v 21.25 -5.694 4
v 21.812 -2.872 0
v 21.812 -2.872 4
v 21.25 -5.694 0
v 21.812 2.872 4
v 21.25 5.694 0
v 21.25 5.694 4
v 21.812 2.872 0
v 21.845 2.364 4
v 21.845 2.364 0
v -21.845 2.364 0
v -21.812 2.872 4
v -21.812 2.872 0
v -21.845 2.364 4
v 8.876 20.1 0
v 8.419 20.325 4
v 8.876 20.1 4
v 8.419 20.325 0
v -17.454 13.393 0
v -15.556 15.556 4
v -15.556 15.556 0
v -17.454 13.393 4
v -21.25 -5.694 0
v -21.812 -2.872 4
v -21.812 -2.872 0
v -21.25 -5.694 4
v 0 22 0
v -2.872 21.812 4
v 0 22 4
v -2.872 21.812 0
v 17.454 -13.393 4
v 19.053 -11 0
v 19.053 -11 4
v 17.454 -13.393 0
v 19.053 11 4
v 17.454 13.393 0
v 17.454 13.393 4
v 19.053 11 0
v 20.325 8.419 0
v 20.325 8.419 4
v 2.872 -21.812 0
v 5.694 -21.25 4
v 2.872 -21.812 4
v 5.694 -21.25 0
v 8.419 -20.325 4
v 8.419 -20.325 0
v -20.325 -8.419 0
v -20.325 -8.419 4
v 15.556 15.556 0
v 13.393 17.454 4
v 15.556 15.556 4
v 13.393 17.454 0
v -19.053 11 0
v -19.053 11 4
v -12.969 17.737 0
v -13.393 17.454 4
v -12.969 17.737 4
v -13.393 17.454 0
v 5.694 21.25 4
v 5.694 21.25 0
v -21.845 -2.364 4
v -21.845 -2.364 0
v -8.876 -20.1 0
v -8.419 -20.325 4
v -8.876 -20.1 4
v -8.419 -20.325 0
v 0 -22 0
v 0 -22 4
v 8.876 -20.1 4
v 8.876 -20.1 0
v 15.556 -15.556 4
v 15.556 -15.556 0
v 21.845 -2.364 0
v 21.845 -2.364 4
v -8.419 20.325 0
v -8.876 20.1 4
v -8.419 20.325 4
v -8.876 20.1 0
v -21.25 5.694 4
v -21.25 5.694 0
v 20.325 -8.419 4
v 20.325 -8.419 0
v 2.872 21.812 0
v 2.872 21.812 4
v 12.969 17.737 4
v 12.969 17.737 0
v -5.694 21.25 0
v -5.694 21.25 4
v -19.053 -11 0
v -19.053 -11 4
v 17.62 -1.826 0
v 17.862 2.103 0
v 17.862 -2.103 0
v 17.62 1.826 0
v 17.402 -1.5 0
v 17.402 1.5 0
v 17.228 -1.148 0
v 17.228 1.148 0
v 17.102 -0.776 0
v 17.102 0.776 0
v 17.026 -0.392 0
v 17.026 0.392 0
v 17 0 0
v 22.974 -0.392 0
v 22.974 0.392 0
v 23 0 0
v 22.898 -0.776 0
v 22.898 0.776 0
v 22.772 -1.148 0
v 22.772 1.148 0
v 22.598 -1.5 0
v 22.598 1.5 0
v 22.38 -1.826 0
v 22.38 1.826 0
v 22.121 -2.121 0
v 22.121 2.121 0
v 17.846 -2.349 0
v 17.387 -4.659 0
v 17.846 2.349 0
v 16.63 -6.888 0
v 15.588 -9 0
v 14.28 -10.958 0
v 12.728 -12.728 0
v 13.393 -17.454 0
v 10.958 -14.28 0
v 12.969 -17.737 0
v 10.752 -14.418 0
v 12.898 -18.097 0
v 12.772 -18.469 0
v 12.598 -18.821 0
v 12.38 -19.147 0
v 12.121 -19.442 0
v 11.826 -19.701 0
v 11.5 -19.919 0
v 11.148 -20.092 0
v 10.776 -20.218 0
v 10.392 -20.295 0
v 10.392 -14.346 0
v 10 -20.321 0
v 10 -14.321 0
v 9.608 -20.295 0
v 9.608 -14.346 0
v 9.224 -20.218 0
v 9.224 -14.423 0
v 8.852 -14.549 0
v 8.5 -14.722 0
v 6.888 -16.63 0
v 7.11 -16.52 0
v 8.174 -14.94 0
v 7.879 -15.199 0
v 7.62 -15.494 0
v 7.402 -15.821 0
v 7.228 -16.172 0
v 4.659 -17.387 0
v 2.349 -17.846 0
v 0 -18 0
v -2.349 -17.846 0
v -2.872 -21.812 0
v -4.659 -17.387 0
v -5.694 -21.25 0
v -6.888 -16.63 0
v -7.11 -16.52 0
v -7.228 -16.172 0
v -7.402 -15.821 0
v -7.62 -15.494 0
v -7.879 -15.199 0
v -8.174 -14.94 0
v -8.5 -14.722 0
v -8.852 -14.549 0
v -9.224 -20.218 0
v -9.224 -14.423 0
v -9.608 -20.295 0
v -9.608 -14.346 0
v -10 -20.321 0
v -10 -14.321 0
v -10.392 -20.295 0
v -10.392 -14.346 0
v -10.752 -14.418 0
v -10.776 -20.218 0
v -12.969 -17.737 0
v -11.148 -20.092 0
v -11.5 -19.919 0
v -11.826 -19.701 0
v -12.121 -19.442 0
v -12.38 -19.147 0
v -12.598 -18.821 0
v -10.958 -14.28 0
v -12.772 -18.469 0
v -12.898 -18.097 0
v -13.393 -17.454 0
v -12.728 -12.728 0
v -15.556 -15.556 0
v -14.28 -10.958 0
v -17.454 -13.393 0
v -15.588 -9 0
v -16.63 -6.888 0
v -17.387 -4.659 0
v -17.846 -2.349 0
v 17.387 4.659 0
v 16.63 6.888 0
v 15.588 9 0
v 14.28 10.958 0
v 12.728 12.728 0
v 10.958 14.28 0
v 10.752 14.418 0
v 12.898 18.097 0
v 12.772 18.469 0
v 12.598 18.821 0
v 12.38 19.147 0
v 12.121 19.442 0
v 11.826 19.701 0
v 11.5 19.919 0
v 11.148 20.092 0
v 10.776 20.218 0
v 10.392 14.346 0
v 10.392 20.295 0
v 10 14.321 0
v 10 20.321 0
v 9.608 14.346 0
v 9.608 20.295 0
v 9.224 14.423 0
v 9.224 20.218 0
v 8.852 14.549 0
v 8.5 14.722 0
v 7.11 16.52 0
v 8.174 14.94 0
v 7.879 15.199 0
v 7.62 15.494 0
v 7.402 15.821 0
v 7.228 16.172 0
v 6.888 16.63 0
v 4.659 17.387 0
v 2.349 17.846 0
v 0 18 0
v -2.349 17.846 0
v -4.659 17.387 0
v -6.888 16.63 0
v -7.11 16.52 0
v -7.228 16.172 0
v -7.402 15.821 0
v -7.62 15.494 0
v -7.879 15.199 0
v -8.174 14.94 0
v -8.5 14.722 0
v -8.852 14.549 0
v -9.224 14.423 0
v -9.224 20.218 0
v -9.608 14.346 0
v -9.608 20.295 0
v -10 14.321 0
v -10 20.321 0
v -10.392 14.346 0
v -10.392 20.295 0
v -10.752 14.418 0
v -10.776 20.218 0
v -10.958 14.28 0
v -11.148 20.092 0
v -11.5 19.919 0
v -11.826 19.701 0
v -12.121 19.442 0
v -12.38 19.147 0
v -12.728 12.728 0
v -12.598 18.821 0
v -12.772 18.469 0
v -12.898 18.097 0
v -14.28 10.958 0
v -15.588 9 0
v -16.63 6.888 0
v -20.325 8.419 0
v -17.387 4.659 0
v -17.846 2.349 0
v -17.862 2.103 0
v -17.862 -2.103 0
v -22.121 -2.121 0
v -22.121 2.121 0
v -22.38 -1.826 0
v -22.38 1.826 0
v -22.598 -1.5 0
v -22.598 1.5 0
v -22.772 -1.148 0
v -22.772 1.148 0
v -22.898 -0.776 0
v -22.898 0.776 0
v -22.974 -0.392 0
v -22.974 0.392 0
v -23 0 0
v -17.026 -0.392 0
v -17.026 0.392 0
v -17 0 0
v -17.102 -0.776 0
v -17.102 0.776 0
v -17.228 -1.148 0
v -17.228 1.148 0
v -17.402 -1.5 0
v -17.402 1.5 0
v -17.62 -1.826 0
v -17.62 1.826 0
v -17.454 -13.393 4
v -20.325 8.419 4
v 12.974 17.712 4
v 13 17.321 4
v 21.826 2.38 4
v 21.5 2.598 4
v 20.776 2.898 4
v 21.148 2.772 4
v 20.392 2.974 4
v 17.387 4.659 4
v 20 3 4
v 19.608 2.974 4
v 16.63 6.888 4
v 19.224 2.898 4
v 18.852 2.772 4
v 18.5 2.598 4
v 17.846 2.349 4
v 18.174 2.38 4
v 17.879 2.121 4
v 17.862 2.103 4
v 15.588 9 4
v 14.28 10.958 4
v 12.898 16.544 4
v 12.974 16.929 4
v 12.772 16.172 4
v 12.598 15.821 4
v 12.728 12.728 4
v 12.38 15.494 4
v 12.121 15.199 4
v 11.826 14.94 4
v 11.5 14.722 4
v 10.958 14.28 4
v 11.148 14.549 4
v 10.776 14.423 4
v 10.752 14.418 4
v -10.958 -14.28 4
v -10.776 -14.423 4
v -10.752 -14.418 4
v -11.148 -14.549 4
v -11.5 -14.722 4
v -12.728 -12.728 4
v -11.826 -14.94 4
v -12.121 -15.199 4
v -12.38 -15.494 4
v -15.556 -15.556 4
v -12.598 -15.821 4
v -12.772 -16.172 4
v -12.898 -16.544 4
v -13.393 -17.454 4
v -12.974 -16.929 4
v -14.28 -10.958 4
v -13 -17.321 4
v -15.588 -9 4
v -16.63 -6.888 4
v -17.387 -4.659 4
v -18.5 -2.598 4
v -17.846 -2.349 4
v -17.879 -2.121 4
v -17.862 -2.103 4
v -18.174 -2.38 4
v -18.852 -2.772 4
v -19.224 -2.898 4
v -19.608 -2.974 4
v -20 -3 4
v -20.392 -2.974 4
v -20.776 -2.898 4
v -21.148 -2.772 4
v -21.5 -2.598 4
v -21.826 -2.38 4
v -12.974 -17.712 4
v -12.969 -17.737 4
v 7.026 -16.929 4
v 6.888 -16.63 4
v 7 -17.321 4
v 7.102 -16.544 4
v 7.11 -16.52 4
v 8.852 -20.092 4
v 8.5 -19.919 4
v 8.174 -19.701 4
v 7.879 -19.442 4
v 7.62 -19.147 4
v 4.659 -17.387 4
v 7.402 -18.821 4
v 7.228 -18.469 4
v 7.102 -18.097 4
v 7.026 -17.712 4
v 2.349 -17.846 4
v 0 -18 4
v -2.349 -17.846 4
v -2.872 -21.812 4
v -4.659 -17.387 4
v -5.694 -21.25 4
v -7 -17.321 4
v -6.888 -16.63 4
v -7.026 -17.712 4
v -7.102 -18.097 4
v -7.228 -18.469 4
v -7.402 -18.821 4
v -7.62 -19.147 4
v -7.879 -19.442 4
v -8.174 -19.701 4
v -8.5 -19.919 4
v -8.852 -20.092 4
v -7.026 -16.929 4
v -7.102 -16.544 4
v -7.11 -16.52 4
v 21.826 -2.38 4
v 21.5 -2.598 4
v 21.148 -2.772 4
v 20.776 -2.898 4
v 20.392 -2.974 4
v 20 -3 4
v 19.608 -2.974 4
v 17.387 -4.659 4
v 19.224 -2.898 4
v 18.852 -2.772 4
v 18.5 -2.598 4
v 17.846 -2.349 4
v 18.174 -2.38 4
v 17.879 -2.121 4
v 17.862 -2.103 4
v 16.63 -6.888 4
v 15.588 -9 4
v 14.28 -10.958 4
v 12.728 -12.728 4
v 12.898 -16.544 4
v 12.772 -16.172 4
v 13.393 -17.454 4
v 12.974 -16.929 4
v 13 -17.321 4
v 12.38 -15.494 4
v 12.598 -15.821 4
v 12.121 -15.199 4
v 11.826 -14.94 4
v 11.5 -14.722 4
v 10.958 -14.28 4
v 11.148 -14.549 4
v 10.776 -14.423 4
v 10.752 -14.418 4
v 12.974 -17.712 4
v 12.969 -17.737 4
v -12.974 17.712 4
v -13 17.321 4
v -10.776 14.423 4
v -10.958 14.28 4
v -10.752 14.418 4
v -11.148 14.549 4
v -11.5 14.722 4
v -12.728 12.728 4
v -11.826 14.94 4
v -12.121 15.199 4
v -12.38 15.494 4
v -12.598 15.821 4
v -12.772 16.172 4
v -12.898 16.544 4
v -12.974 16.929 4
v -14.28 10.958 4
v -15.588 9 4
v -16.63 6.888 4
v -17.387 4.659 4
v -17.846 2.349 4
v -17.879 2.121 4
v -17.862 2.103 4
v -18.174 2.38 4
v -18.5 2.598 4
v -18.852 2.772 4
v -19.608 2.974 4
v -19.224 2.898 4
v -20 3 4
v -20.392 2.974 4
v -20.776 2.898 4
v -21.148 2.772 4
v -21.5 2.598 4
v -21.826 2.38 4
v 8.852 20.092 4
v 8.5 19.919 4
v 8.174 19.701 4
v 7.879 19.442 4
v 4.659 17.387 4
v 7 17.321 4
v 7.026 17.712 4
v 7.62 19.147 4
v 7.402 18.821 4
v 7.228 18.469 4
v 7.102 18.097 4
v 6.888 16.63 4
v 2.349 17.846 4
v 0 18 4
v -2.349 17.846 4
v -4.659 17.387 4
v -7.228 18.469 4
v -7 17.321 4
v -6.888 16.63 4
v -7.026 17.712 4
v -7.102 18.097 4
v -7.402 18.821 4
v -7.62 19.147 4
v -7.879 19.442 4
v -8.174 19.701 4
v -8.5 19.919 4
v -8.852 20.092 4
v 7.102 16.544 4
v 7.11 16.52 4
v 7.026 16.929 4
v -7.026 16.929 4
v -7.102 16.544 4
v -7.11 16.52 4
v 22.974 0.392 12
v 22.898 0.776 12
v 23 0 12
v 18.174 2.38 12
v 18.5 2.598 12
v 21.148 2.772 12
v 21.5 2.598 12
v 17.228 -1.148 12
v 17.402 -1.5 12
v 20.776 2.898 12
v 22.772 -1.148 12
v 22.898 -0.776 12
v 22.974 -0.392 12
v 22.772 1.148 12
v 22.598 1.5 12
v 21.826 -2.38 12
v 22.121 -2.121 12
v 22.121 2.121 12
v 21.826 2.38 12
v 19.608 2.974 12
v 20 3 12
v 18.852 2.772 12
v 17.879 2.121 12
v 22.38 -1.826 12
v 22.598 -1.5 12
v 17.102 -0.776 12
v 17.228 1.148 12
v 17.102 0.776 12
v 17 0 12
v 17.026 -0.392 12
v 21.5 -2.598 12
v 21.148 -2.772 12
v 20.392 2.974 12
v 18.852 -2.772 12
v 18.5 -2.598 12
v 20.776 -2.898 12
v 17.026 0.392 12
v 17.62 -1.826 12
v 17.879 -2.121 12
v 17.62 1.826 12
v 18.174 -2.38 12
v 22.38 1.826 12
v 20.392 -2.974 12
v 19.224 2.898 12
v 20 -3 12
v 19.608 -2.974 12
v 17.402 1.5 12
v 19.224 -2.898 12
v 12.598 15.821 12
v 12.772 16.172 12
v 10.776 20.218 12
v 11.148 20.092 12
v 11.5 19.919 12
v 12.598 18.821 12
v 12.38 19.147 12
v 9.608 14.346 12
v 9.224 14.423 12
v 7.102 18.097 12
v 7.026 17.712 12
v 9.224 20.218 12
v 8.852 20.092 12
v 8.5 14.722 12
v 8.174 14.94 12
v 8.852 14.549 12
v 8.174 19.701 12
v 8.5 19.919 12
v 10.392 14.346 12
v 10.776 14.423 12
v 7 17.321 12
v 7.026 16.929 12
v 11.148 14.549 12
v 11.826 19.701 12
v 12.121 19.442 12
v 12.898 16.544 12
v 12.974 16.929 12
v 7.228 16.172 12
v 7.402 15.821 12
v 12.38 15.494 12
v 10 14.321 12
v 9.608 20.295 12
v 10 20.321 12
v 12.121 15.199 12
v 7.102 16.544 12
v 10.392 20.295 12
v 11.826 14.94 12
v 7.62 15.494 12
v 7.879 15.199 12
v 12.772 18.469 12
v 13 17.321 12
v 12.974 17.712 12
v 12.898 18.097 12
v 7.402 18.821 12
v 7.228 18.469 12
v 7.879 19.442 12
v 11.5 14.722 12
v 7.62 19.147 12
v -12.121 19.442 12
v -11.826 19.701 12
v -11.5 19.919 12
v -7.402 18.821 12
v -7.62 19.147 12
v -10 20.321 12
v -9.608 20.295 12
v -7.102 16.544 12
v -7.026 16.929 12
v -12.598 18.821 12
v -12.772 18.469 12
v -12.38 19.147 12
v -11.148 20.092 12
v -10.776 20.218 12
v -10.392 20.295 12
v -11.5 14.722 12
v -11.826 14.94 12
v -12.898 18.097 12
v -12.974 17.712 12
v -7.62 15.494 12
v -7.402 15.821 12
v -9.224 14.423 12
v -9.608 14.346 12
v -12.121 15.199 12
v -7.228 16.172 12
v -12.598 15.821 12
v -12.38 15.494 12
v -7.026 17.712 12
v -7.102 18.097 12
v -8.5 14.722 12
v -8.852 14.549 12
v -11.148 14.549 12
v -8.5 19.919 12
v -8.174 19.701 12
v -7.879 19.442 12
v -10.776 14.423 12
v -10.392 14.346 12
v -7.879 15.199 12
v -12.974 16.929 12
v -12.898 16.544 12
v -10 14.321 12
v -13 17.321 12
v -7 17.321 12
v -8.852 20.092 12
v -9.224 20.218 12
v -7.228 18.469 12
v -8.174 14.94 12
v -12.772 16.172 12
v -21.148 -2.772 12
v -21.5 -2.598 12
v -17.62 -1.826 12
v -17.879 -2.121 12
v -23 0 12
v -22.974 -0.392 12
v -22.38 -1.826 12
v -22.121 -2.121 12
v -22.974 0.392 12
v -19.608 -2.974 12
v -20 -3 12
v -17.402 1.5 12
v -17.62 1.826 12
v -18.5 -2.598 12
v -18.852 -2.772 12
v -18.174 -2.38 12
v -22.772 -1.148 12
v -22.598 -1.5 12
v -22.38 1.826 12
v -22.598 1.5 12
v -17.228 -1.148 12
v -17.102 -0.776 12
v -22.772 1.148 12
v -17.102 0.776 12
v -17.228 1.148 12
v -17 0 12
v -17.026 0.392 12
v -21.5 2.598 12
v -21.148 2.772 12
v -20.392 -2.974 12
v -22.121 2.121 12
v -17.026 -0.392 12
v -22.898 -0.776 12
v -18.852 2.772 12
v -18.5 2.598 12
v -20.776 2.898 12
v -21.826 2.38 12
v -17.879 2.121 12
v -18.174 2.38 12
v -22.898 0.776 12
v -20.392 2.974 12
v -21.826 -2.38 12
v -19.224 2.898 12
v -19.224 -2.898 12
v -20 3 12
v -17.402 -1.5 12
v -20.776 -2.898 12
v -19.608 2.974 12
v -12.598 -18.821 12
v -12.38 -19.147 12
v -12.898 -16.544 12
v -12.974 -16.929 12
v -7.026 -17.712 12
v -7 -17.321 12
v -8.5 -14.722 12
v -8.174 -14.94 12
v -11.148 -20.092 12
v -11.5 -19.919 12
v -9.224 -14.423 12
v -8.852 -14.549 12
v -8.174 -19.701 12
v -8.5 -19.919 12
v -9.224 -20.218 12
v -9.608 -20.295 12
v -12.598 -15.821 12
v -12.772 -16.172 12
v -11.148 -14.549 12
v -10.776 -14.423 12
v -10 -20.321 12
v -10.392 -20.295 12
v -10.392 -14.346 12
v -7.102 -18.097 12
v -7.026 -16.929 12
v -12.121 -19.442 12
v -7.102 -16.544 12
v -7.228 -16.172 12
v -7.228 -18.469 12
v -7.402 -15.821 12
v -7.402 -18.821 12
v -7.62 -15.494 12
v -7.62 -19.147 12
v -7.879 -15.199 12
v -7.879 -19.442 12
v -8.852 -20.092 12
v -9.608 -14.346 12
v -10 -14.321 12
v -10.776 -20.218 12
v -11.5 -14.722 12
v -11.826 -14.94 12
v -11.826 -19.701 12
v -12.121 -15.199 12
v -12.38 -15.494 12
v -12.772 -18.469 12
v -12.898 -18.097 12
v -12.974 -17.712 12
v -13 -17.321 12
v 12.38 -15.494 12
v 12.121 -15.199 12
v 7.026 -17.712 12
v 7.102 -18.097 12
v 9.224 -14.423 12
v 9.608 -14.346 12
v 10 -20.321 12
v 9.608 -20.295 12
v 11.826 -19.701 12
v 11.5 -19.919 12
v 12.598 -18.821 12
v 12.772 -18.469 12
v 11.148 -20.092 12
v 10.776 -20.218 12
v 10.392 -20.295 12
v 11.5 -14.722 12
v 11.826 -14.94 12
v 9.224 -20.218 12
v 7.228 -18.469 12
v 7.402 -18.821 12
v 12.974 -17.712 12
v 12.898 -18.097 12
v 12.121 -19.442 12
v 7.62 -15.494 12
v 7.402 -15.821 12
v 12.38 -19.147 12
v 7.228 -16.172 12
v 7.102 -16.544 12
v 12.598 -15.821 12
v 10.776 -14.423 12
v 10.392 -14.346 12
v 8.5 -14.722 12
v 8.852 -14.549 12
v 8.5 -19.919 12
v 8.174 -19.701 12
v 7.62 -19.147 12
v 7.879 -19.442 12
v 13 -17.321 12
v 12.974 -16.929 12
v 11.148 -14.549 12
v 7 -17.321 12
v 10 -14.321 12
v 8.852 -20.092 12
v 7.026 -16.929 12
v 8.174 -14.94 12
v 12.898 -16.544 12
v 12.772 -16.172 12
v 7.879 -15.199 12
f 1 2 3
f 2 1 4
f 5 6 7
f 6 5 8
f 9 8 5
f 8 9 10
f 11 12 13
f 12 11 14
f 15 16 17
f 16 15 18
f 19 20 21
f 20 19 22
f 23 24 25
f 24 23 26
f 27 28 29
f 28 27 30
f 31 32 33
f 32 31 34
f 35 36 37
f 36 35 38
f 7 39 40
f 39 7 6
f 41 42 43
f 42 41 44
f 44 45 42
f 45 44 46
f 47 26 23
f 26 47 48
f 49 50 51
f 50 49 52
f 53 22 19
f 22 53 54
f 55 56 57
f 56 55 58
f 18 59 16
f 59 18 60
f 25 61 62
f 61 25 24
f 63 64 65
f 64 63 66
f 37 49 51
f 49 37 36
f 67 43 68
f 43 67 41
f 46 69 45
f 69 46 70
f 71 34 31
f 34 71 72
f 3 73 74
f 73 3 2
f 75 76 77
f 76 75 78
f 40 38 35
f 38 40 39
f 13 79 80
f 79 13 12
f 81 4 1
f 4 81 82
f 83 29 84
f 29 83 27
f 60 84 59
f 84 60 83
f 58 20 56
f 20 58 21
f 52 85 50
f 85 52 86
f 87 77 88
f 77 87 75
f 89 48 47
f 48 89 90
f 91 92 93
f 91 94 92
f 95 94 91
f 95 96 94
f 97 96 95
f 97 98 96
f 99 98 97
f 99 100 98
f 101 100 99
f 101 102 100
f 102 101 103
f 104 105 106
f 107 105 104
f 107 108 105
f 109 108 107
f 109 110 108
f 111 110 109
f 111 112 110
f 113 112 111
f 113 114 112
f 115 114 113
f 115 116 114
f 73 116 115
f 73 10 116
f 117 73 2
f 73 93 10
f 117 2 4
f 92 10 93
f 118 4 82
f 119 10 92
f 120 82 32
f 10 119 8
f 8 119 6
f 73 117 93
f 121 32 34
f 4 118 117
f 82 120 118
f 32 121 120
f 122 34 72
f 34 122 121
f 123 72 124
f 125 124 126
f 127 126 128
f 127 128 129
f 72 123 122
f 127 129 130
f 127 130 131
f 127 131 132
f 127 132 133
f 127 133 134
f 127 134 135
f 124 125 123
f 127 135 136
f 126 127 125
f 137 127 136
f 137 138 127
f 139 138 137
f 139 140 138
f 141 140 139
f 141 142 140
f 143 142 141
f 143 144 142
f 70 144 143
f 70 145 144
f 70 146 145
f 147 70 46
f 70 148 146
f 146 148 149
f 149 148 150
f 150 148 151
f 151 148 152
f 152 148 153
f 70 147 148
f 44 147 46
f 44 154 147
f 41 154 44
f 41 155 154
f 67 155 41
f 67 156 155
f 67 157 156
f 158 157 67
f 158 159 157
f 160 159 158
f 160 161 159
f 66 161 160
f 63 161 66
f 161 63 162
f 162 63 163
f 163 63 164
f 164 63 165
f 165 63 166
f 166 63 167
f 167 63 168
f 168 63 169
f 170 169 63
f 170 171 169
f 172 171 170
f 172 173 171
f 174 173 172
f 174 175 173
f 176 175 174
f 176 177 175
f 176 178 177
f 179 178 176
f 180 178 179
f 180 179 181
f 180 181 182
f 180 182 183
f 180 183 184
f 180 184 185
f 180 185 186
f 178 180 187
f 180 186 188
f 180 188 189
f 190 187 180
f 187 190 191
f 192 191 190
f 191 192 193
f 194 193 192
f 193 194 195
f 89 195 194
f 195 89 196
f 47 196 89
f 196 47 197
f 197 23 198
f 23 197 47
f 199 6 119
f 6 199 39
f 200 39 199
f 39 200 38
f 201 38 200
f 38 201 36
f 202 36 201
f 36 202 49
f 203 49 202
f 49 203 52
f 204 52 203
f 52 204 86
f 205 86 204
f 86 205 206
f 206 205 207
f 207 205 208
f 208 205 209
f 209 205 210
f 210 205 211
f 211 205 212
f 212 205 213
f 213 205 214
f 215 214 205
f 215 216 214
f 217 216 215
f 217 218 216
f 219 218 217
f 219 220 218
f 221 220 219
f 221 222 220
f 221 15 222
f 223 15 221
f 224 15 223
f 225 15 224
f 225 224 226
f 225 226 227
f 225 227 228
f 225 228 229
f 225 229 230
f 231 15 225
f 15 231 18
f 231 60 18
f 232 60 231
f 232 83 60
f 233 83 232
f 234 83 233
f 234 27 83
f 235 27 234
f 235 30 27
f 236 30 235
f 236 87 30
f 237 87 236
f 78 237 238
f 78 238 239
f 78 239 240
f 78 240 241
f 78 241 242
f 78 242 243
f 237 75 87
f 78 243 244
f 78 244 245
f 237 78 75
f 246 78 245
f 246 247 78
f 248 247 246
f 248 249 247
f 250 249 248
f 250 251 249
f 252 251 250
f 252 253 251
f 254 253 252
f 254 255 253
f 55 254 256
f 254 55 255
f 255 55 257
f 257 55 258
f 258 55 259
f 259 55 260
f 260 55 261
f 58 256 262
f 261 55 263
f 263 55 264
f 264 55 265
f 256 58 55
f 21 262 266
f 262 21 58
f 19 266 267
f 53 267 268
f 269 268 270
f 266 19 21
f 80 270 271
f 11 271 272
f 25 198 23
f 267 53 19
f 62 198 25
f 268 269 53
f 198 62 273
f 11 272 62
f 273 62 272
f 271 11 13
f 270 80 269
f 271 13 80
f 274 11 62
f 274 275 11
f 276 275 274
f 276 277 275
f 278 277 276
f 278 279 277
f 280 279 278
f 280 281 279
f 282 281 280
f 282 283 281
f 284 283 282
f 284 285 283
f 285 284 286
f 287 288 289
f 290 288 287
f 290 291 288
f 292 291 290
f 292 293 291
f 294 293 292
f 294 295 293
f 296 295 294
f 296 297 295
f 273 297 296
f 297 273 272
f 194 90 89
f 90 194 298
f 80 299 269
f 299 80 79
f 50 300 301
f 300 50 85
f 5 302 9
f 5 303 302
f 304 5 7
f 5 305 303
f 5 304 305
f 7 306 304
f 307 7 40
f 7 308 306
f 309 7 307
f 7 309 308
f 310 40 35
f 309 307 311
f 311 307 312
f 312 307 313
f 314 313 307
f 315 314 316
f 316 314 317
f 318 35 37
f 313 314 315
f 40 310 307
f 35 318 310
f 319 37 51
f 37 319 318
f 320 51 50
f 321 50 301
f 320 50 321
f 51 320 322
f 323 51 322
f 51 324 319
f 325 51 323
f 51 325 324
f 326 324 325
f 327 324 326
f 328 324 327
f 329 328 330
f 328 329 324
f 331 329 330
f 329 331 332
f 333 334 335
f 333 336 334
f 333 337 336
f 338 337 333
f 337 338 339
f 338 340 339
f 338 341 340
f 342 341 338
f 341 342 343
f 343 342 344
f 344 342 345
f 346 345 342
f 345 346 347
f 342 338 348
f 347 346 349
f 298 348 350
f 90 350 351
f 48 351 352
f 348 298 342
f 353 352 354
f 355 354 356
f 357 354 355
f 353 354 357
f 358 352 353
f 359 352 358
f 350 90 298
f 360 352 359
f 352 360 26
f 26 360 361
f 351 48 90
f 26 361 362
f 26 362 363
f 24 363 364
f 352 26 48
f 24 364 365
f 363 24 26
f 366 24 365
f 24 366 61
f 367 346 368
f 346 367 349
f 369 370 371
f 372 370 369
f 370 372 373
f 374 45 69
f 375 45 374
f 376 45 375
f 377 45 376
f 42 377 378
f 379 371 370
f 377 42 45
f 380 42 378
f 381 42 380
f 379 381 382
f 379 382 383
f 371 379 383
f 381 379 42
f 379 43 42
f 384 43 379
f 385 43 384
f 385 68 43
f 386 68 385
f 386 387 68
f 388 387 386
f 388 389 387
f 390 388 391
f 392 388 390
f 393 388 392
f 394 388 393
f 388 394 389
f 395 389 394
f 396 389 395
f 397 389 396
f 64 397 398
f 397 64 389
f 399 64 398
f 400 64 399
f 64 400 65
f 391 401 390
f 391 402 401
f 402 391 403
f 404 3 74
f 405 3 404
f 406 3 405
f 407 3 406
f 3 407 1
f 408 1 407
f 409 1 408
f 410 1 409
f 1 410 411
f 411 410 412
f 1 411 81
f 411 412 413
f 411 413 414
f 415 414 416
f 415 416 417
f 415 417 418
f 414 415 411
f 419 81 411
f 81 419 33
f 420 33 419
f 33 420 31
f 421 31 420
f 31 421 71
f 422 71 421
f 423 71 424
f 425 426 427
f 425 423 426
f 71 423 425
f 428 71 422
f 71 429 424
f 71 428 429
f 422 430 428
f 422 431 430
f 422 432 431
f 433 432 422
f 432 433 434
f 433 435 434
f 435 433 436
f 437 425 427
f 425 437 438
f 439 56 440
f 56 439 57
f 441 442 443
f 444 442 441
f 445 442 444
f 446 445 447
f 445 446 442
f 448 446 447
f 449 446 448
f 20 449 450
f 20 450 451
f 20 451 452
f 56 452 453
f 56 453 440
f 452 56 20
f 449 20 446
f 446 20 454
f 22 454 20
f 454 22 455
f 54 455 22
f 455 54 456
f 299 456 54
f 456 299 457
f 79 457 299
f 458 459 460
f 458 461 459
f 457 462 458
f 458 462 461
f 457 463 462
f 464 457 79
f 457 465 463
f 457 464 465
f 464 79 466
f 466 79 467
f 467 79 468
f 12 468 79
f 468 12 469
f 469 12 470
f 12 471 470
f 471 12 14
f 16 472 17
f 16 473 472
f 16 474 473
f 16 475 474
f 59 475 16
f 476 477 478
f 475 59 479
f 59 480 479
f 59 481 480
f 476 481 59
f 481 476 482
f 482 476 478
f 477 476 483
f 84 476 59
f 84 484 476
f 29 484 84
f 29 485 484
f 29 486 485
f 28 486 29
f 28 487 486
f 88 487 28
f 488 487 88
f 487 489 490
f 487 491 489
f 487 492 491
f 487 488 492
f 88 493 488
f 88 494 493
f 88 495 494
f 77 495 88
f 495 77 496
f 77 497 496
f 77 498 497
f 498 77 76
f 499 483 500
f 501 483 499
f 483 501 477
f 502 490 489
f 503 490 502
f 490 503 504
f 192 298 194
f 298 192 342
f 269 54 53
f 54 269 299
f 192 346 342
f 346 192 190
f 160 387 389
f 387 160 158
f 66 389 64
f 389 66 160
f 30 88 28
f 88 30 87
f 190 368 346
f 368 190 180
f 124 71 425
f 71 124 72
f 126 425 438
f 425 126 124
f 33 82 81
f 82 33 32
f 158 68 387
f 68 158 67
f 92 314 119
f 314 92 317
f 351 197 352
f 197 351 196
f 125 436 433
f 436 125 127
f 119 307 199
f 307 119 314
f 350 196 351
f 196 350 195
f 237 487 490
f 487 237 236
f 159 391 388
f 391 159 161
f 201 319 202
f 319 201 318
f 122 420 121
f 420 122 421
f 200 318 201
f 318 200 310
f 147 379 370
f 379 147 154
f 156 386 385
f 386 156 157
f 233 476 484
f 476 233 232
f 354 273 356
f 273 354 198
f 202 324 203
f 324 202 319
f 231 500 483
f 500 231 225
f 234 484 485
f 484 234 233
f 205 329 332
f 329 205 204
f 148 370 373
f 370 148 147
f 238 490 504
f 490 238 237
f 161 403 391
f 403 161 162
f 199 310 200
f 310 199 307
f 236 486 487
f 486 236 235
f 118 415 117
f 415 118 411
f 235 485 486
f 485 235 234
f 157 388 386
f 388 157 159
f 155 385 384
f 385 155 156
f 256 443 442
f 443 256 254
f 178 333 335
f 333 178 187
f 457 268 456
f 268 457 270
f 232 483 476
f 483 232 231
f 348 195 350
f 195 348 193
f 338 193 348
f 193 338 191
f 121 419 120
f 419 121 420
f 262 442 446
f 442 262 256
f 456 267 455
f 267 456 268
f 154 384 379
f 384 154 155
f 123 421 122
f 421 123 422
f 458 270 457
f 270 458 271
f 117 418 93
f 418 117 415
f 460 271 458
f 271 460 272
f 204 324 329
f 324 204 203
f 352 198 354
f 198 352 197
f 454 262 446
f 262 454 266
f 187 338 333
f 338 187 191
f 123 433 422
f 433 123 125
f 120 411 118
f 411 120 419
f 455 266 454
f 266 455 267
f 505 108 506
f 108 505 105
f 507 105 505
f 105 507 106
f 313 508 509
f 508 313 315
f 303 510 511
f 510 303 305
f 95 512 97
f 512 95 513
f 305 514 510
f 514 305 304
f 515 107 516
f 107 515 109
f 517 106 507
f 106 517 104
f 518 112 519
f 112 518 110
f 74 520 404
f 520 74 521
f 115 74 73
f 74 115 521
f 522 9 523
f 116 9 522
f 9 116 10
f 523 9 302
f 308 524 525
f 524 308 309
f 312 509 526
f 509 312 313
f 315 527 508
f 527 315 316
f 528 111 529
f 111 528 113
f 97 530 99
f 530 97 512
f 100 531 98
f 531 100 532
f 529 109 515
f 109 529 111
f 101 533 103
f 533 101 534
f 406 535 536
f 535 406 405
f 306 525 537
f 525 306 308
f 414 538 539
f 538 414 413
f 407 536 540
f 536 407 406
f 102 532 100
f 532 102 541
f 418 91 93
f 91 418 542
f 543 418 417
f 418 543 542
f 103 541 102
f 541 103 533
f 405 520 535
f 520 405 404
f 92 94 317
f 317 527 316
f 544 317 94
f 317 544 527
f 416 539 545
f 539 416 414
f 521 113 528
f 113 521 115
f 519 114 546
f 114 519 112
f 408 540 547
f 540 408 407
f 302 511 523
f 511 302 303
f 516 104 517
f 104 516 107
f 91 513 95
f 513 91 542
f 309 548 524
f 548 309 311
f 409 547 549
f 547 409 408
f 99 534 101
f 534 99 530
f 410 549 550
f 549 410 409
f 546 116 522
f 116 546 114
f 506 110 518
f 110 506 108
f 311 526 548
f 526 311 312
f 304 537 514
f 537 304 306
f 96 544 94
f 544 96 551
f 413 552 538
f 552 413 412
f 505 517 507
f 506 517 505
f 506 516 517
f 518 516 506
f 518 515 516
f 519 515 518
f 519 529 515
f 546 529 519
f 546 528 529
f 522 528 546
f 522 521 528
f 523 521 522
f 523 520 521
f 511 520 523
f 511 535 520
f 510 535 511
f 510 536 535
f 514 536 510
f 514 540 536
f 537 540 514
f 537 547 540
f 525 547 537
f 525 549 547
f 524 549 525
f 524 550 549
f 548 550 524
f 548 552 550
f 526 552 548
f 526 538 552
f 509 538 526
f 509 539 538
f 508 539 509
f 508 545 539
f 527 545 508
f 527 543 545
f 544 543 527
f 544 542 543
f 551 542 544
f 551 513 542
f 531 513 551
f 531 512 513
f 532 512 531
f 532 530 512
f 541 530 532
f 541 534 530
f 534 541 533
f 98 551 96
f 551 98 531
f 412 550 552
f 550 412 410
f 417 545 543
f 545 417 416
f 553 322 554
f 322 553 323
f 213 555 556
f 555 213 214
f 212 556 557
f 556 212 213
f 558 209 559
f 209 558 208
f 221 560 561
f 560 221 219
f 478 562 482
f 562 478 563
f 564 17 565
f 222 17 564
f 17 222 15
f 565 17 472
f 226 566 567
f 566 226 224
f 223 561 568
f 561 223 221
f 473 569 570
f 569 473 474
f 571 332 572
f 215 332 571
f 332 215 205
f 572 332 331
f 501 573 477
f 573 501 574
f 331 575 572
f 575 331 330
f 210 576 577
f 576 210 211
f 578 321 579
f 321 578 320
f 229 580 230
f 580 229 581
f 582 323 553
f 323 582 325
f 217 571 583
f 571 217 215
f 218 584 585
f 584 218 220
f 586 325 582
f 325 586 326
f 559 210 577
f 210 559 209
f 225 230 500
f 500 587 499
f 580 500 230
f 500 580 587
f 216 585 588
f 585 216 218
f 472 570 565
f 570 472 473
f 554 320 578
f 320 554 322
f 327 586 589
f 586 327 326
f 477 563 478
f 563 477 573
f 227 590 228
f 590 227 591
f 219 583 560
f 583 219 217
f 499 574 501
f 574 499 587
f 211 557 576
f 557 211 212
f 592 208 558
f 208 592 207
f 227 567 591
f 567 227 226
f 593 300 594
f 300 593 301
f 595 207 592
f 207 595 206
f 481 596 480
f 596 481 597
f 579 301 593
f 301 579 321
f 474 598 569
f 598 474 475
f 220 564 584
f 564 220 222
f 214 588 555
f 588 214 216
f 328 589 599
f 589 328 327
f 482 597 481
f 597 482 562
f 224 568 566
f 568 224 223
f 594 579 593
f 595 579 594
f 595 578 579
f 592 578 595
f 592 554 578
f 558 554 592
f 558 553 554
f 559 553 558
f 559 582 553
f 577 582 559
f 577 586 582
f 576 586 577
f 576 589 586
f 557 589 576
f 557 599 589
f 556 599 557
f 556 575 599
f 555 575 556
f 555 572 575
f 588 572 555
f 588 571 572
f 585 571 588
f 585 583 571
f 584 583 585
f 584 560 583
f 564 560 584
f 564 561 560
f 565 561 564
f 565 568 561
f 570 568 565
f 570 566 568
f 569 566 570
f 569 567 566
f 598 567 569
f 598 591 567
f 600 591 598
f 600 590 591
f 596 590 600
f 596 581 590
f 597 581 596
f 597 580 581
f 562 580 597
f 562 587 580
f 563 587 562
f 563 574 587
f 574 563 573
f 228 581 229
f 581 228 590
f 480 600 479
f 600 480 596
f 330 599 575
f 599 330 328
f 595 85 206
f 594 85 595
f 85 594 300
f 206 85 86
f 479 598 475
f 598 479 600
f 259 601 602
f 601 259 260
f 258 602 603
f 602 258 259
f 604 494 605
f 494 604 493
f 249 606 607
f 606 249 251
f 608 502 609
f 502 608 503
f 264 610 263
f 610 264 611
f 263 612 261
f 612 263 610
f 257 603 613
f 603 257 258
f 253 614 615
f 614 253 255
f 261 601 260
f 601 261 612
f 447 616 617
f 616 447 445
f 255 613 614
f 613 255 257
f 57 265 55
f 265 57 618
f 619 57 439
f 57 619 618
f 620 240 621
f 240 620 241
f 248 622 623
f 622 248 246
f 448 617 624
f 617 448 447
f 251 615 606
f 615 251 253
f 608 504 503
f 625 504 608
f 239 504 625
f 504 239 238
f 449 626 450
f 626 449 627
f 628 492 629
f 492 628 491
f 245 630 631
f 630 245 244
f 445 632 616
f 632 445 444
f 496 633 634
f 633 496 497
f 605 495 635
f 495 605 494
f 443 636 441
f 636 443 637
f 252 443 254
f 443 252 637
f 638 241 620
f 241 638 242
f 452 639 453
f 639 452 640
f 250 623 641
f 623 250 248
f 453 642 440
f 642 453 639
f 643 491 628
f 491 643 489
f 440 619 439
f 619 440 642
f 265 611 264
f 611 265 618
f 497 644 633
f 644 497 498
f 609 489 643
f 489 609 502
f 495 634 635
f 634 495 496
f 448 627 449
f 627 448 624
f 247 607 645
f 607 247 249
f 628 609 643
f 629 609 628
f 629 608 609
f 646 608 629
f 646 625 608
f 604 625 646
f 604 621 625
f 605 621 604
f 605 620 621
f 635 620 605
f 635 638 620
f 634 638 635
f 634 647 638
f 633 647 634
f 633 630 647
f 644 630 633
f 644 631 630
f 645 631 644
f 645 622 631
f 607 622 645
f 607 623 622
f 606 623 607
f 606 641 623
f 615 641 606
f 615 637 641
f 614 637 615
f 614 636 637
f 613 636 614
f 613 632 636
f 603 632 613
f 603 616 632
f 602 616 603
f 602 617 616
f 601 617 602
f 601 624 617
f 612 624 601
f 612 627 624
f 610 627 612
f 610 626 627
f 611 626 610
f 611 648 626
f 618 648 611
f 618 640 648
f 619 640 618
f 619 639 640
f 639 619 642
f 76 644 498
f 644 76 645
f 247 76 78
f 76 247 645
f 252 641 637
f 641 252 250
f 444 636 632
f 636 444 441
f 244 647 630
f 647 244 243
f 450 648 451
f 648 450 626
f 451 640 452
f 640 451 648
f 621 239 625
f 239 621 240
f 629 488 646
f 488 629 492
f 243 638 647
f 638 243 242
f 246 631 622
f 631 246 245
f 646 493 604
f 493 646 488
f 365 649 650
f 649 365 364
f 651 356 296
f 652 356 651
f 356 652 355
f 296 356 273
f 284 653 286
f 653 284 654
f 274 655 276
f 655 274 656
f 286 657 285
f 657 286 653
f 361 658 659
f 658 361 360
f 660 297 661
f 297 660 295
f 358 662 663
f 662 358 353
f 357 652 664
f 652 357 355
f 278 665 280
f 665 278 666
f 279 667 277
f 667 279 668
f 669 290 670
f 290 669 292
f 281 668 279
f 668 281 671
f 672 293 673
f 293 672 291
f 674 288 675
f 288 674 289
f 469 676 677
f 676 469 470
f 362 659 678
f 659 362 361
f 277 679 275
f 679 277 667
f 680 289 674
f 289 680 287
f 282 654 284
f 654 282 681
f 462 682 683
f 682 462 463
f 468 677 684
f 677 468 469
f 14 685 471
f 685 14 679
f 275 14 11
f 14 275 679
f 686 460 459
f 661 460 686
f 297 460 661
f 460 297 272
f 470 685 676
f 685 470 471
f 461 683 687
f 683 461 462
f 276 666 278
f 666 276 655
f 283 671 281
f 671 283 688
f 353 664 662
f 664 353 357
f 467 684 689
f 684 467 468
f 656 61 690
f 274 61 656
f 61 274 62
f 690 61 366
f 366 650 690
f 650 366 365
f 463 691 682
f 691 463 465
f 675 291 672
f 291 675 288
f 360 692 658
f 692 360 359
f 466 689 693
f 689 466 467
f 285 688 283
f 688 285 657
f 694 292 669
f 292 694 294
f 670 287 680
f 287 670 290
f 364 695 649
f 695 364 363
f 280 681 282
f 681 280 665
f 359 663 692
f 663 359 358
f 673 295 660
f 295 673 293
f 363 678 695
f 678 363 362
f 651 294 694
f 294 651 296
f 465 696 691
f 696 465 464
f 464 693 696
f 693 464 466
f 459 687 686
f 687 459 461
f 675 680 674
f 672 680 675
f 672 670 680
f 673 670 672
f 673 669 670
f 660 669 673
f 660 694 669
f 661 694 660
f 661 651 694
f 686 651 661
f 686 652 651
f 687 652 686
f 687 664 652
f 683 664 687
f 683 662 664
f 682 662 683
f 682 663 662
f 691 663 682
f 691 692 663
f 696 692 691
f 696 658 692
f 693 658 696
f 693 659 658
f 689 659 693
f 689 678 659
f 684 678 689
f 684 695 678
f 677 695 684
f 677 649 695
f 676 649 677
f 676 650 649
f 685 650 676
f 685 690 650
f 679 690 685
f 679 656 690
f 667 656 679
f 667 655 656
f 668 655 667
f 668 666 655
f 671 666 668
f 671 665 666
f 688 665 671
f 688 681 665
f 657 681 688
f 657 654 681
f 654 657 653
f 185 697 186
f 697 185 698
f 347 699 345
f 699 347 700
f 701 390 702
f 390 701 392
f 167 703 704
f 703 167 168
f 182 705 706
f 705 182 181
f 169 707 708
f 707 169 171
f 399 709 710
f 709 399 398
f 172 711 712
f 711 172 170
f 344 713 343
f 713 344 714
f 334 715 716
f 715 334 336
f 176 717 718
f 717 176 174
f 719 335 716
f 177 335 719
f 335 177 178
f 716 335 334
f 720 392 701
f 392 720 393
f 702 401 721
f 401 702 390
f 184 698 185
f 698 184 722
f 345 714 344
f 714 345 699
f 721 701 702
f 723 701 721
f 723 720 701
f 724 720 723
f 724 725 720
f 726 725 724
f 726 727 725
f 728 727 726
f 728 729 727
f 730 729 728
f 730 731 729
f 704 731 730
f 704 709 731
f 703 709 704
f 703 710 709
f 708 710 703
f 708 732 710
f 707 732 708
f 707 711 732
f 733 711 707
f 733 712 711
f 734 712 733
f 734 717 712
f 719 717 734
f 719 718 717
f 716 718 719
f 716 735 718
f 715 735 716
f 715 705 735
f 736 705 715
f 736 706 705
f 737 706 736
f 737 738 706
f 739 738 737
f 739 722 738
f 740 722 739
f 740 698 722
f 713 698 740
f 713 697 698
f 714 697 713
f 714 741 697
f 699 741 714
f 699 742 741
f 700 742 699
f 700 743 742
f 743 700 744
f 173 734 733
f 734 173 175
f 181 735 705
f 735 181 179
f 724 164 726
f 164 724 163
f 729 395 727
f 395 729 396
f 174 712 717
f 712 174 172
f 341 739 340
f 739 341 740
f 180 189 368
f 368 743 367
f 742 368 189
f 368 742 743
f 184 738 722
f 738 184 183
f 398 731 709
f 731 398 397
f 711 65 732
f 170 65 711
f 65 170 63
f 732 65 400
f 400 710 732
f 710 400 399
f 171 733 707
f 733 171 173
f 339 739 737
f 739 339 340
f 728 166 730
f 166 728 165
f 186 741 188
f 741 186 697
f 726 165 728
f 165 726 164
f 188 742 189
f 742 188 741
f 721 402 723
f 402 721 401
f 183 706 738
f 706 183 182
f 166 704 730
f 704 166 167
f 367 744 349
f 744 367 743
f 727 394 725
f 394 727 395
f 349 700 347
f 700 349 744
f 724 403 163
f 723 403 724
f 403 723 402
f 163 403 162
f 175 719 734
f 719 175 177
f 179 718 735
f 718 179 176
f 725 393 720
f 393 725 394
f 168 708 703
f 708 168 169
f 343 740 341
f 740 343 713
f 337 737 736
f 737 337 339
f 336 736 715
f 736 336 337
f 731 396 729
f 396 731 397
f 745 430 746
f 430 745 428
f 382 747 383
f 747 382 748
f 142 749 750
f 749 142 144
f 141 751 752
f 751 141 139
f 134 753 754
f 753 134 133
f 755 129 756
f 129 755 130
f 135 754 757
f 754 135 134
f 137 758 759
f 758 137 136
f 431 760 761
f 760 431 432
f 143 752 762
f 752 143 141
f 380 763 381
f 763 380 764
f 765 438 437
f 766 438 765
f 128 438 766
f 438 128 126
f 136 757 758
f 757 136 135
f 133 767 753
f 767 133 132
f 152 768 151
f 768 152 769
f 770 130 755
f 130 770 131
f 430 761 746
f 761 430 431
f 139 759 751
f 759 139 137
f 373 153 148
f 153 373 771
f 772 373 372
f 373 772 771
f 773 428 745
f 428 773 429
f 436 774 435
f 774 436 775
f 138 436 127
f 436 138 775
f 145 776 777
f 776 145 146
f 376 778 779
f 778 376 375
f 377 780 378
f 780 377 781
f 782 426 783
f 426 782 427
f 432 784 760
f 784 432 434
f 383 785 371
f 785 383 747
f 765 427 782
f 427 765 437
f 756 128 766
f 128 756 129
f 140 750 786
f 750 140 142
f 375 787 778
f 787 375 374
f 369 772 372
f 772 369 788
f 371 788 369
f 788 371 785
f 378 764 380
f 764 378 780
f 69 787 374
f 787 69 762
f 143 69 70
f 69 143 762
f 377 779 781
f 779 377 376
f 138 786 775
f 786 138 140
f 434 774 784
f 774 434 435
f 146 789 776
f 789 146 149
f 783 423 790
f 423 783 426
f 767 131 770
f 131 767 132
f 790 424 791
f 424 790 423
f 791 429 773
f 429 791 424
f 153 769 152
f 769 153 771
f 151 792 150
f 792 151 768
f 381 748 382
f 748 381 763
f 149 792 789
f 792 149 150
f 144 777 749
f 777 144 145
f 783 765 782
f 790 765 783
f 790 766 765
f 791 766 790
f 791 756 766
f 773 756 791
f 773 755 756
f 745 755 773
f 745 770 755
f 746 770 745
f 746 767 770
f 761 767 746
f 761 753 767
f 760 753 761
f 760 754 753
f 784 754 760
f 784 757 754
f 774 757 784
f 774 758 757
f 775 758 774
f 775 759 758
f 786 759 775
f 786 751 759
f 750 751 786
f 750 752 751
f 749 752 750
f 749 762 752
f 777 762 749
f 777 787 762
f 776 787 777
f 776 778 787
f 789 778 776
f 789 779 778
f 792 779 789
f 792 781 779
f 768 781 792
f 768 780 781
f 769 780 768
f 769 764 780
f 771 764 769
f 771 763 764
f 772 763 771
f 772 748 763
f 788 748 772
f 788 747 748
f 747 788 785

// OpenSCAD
// Parametric bolt flange
$fn      = 48;
wall     = 2;
n        = 6;      // number of posts
r_bolt   = 3;
r_ring   = 20;
post_h   = 12;

module post(h) {
    cylinder(h = h, r = r_bolt);
}

module ring() {
    difference() {
        cylinder(h = 4, r = r_ring + wall);
        translate([0, 0, -1]) cylinder(h = 20, r = r_ring - wall);
    }
}

module flange() {
    union() {
        ring();
        for (i = [0 : n - 1]) {
            rotate([0, 0, i * 360 / n])
                translate([r_ring, 0, 0])
                    post(post_h);
        }
    }
}

flange();
